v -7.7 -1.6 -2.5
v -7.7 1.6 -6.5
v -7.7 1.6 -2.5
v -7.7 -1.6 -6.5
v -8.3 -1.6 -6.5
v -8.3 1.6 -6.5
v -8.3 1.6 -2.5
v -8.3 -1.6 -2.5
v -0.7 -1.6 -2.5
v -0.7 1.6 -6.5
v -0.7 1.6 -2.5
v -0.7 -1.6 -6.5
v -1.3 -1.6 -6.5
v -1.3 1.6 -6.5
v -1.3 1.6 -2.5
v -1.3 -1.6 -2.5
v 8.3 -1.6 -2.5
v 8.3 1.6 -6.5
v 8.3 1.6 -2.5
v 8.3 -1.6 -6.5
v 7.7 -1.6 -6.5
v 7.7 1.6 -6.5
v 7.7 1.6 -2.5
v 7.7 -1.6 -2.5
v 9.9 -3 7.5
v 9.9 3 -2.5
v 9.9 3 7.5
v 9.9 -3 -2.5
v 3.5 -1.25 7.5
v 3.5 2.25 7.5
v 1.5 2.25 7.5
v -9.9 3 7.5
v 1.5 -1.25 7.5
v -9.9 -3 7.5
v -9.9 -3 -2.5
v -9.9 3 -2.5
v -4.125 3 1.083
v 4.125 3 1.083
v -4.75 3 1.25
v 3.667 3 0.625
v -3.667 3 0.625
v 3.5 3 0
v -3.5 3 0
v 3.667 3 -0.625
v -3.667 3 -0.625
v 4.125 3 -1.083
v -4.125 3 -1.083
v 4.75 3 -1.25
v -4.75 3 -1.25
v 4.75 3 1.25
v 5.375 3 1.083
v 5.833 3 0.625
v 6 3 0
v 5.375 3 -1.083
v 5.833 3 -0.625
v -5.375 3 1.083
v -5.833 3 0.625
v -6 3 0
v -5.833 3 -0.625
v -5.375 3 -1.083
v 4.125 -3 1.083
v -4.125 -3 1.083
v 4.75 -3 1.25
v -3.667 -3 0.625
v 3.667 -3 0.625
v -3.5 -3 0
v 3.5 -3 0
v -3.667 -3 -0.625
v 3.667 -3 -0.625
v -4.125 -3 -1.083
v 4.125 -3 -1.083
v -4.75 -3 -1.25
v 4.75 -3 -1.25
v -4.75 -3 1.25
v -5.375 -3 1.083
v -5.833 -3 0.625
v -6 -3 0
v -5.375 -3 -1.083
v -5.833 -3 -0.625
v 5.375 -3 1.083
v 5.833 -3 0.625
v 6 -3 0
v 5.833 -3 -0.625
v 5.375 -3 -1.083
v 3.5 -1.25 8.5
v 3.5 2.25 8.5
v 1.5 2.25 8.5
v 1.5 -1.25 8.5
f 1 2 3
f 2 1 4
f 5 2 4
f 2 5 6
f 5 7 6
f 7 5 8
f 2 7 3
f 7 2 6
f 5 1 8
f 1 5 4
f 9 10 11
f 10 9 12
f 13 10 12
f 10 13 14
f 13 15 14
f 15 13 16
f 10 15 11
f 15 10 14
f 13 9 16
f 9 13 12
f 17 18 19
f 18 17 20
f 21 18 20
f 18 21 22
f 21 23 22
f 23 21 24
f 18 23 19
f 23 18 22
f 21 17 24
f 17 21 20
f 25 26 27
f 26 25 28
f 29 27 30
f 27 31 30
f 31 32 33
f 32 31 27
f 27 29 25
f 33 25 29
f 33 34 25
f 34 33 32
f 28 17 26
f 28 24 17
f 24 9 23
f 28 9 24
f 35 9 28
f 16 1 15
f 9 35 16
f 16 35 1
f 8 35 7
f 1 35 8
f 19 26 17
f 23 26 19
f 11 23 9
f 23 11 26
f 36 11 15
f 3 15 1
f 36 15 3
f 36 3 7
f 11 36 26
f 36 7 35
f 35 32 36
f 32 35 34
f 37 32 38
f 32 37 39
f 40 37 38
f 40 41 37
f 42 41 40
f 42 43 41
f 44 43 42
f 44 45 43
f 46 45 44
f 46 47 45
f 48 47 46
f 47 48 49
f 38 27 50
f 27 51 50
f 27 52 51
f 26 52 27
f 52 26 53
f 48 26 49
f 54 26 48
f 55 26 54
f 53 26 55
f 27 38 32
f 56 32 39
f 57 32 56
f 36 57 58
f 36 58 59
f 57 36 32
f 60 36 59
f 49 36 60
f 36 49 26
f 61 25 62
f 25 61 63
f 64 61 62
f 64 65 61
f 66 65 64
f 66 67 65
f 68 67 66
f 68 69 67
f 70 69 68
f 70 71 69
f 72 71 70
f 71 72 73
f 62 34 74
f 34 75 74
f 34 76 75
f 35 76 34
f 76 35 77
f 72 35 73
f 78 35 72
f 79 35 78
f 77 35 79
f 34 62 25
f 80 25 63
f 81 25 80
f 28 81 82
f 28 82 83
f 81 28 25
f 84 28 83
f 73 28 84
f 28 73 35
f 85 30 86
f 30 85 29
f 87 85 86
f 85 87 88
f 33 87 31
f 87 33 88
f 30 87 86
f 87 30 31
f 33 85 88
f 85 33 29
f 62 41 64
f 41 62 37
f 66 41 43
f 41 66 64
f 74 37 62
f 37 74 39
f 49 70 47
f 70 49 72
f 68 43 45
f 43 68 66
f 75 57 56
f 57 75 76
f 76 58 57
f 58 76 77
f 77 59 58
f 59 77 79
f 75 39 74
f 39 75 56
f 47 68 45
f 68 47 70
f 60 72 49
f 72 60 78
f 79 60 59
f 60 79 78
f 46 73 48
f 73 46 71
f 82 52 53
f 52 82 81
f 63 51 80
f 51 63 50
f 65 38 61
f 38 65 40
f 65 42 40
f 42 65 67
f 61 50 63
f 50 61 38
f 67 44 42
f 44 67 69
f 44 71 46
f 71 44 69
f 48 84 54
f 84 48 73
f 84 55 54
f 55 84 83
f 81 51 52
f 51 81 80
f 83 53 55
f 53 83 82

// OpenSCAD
// Don't print this file, purchase real micro switches
// e.g. Honeywell ZM10B10A01 or OMRON SS-5 or similar.

module microswitch() {
  difference() {
    union() {
      translate([0, 0, 2.5])
        cube([19.8, 6, 10], center=true);
      translate([2.5, 0.5, 6])
        cube([2, 3.5, 5], center=true);
      for (x = [-8, -1, 8]) {
        translate([x, 0, 0])
          cube([0.6, 3.2, 13], center=true);
      }
    }
    for (x = [-9.5/2, 9.5/2]) {
      translate([x, 0, 0]) rotate([90, 0, 0])
        cylinder(r=2.5/2, h=20, center=true, $fn=12);
    }
  }
}

microswitch();
